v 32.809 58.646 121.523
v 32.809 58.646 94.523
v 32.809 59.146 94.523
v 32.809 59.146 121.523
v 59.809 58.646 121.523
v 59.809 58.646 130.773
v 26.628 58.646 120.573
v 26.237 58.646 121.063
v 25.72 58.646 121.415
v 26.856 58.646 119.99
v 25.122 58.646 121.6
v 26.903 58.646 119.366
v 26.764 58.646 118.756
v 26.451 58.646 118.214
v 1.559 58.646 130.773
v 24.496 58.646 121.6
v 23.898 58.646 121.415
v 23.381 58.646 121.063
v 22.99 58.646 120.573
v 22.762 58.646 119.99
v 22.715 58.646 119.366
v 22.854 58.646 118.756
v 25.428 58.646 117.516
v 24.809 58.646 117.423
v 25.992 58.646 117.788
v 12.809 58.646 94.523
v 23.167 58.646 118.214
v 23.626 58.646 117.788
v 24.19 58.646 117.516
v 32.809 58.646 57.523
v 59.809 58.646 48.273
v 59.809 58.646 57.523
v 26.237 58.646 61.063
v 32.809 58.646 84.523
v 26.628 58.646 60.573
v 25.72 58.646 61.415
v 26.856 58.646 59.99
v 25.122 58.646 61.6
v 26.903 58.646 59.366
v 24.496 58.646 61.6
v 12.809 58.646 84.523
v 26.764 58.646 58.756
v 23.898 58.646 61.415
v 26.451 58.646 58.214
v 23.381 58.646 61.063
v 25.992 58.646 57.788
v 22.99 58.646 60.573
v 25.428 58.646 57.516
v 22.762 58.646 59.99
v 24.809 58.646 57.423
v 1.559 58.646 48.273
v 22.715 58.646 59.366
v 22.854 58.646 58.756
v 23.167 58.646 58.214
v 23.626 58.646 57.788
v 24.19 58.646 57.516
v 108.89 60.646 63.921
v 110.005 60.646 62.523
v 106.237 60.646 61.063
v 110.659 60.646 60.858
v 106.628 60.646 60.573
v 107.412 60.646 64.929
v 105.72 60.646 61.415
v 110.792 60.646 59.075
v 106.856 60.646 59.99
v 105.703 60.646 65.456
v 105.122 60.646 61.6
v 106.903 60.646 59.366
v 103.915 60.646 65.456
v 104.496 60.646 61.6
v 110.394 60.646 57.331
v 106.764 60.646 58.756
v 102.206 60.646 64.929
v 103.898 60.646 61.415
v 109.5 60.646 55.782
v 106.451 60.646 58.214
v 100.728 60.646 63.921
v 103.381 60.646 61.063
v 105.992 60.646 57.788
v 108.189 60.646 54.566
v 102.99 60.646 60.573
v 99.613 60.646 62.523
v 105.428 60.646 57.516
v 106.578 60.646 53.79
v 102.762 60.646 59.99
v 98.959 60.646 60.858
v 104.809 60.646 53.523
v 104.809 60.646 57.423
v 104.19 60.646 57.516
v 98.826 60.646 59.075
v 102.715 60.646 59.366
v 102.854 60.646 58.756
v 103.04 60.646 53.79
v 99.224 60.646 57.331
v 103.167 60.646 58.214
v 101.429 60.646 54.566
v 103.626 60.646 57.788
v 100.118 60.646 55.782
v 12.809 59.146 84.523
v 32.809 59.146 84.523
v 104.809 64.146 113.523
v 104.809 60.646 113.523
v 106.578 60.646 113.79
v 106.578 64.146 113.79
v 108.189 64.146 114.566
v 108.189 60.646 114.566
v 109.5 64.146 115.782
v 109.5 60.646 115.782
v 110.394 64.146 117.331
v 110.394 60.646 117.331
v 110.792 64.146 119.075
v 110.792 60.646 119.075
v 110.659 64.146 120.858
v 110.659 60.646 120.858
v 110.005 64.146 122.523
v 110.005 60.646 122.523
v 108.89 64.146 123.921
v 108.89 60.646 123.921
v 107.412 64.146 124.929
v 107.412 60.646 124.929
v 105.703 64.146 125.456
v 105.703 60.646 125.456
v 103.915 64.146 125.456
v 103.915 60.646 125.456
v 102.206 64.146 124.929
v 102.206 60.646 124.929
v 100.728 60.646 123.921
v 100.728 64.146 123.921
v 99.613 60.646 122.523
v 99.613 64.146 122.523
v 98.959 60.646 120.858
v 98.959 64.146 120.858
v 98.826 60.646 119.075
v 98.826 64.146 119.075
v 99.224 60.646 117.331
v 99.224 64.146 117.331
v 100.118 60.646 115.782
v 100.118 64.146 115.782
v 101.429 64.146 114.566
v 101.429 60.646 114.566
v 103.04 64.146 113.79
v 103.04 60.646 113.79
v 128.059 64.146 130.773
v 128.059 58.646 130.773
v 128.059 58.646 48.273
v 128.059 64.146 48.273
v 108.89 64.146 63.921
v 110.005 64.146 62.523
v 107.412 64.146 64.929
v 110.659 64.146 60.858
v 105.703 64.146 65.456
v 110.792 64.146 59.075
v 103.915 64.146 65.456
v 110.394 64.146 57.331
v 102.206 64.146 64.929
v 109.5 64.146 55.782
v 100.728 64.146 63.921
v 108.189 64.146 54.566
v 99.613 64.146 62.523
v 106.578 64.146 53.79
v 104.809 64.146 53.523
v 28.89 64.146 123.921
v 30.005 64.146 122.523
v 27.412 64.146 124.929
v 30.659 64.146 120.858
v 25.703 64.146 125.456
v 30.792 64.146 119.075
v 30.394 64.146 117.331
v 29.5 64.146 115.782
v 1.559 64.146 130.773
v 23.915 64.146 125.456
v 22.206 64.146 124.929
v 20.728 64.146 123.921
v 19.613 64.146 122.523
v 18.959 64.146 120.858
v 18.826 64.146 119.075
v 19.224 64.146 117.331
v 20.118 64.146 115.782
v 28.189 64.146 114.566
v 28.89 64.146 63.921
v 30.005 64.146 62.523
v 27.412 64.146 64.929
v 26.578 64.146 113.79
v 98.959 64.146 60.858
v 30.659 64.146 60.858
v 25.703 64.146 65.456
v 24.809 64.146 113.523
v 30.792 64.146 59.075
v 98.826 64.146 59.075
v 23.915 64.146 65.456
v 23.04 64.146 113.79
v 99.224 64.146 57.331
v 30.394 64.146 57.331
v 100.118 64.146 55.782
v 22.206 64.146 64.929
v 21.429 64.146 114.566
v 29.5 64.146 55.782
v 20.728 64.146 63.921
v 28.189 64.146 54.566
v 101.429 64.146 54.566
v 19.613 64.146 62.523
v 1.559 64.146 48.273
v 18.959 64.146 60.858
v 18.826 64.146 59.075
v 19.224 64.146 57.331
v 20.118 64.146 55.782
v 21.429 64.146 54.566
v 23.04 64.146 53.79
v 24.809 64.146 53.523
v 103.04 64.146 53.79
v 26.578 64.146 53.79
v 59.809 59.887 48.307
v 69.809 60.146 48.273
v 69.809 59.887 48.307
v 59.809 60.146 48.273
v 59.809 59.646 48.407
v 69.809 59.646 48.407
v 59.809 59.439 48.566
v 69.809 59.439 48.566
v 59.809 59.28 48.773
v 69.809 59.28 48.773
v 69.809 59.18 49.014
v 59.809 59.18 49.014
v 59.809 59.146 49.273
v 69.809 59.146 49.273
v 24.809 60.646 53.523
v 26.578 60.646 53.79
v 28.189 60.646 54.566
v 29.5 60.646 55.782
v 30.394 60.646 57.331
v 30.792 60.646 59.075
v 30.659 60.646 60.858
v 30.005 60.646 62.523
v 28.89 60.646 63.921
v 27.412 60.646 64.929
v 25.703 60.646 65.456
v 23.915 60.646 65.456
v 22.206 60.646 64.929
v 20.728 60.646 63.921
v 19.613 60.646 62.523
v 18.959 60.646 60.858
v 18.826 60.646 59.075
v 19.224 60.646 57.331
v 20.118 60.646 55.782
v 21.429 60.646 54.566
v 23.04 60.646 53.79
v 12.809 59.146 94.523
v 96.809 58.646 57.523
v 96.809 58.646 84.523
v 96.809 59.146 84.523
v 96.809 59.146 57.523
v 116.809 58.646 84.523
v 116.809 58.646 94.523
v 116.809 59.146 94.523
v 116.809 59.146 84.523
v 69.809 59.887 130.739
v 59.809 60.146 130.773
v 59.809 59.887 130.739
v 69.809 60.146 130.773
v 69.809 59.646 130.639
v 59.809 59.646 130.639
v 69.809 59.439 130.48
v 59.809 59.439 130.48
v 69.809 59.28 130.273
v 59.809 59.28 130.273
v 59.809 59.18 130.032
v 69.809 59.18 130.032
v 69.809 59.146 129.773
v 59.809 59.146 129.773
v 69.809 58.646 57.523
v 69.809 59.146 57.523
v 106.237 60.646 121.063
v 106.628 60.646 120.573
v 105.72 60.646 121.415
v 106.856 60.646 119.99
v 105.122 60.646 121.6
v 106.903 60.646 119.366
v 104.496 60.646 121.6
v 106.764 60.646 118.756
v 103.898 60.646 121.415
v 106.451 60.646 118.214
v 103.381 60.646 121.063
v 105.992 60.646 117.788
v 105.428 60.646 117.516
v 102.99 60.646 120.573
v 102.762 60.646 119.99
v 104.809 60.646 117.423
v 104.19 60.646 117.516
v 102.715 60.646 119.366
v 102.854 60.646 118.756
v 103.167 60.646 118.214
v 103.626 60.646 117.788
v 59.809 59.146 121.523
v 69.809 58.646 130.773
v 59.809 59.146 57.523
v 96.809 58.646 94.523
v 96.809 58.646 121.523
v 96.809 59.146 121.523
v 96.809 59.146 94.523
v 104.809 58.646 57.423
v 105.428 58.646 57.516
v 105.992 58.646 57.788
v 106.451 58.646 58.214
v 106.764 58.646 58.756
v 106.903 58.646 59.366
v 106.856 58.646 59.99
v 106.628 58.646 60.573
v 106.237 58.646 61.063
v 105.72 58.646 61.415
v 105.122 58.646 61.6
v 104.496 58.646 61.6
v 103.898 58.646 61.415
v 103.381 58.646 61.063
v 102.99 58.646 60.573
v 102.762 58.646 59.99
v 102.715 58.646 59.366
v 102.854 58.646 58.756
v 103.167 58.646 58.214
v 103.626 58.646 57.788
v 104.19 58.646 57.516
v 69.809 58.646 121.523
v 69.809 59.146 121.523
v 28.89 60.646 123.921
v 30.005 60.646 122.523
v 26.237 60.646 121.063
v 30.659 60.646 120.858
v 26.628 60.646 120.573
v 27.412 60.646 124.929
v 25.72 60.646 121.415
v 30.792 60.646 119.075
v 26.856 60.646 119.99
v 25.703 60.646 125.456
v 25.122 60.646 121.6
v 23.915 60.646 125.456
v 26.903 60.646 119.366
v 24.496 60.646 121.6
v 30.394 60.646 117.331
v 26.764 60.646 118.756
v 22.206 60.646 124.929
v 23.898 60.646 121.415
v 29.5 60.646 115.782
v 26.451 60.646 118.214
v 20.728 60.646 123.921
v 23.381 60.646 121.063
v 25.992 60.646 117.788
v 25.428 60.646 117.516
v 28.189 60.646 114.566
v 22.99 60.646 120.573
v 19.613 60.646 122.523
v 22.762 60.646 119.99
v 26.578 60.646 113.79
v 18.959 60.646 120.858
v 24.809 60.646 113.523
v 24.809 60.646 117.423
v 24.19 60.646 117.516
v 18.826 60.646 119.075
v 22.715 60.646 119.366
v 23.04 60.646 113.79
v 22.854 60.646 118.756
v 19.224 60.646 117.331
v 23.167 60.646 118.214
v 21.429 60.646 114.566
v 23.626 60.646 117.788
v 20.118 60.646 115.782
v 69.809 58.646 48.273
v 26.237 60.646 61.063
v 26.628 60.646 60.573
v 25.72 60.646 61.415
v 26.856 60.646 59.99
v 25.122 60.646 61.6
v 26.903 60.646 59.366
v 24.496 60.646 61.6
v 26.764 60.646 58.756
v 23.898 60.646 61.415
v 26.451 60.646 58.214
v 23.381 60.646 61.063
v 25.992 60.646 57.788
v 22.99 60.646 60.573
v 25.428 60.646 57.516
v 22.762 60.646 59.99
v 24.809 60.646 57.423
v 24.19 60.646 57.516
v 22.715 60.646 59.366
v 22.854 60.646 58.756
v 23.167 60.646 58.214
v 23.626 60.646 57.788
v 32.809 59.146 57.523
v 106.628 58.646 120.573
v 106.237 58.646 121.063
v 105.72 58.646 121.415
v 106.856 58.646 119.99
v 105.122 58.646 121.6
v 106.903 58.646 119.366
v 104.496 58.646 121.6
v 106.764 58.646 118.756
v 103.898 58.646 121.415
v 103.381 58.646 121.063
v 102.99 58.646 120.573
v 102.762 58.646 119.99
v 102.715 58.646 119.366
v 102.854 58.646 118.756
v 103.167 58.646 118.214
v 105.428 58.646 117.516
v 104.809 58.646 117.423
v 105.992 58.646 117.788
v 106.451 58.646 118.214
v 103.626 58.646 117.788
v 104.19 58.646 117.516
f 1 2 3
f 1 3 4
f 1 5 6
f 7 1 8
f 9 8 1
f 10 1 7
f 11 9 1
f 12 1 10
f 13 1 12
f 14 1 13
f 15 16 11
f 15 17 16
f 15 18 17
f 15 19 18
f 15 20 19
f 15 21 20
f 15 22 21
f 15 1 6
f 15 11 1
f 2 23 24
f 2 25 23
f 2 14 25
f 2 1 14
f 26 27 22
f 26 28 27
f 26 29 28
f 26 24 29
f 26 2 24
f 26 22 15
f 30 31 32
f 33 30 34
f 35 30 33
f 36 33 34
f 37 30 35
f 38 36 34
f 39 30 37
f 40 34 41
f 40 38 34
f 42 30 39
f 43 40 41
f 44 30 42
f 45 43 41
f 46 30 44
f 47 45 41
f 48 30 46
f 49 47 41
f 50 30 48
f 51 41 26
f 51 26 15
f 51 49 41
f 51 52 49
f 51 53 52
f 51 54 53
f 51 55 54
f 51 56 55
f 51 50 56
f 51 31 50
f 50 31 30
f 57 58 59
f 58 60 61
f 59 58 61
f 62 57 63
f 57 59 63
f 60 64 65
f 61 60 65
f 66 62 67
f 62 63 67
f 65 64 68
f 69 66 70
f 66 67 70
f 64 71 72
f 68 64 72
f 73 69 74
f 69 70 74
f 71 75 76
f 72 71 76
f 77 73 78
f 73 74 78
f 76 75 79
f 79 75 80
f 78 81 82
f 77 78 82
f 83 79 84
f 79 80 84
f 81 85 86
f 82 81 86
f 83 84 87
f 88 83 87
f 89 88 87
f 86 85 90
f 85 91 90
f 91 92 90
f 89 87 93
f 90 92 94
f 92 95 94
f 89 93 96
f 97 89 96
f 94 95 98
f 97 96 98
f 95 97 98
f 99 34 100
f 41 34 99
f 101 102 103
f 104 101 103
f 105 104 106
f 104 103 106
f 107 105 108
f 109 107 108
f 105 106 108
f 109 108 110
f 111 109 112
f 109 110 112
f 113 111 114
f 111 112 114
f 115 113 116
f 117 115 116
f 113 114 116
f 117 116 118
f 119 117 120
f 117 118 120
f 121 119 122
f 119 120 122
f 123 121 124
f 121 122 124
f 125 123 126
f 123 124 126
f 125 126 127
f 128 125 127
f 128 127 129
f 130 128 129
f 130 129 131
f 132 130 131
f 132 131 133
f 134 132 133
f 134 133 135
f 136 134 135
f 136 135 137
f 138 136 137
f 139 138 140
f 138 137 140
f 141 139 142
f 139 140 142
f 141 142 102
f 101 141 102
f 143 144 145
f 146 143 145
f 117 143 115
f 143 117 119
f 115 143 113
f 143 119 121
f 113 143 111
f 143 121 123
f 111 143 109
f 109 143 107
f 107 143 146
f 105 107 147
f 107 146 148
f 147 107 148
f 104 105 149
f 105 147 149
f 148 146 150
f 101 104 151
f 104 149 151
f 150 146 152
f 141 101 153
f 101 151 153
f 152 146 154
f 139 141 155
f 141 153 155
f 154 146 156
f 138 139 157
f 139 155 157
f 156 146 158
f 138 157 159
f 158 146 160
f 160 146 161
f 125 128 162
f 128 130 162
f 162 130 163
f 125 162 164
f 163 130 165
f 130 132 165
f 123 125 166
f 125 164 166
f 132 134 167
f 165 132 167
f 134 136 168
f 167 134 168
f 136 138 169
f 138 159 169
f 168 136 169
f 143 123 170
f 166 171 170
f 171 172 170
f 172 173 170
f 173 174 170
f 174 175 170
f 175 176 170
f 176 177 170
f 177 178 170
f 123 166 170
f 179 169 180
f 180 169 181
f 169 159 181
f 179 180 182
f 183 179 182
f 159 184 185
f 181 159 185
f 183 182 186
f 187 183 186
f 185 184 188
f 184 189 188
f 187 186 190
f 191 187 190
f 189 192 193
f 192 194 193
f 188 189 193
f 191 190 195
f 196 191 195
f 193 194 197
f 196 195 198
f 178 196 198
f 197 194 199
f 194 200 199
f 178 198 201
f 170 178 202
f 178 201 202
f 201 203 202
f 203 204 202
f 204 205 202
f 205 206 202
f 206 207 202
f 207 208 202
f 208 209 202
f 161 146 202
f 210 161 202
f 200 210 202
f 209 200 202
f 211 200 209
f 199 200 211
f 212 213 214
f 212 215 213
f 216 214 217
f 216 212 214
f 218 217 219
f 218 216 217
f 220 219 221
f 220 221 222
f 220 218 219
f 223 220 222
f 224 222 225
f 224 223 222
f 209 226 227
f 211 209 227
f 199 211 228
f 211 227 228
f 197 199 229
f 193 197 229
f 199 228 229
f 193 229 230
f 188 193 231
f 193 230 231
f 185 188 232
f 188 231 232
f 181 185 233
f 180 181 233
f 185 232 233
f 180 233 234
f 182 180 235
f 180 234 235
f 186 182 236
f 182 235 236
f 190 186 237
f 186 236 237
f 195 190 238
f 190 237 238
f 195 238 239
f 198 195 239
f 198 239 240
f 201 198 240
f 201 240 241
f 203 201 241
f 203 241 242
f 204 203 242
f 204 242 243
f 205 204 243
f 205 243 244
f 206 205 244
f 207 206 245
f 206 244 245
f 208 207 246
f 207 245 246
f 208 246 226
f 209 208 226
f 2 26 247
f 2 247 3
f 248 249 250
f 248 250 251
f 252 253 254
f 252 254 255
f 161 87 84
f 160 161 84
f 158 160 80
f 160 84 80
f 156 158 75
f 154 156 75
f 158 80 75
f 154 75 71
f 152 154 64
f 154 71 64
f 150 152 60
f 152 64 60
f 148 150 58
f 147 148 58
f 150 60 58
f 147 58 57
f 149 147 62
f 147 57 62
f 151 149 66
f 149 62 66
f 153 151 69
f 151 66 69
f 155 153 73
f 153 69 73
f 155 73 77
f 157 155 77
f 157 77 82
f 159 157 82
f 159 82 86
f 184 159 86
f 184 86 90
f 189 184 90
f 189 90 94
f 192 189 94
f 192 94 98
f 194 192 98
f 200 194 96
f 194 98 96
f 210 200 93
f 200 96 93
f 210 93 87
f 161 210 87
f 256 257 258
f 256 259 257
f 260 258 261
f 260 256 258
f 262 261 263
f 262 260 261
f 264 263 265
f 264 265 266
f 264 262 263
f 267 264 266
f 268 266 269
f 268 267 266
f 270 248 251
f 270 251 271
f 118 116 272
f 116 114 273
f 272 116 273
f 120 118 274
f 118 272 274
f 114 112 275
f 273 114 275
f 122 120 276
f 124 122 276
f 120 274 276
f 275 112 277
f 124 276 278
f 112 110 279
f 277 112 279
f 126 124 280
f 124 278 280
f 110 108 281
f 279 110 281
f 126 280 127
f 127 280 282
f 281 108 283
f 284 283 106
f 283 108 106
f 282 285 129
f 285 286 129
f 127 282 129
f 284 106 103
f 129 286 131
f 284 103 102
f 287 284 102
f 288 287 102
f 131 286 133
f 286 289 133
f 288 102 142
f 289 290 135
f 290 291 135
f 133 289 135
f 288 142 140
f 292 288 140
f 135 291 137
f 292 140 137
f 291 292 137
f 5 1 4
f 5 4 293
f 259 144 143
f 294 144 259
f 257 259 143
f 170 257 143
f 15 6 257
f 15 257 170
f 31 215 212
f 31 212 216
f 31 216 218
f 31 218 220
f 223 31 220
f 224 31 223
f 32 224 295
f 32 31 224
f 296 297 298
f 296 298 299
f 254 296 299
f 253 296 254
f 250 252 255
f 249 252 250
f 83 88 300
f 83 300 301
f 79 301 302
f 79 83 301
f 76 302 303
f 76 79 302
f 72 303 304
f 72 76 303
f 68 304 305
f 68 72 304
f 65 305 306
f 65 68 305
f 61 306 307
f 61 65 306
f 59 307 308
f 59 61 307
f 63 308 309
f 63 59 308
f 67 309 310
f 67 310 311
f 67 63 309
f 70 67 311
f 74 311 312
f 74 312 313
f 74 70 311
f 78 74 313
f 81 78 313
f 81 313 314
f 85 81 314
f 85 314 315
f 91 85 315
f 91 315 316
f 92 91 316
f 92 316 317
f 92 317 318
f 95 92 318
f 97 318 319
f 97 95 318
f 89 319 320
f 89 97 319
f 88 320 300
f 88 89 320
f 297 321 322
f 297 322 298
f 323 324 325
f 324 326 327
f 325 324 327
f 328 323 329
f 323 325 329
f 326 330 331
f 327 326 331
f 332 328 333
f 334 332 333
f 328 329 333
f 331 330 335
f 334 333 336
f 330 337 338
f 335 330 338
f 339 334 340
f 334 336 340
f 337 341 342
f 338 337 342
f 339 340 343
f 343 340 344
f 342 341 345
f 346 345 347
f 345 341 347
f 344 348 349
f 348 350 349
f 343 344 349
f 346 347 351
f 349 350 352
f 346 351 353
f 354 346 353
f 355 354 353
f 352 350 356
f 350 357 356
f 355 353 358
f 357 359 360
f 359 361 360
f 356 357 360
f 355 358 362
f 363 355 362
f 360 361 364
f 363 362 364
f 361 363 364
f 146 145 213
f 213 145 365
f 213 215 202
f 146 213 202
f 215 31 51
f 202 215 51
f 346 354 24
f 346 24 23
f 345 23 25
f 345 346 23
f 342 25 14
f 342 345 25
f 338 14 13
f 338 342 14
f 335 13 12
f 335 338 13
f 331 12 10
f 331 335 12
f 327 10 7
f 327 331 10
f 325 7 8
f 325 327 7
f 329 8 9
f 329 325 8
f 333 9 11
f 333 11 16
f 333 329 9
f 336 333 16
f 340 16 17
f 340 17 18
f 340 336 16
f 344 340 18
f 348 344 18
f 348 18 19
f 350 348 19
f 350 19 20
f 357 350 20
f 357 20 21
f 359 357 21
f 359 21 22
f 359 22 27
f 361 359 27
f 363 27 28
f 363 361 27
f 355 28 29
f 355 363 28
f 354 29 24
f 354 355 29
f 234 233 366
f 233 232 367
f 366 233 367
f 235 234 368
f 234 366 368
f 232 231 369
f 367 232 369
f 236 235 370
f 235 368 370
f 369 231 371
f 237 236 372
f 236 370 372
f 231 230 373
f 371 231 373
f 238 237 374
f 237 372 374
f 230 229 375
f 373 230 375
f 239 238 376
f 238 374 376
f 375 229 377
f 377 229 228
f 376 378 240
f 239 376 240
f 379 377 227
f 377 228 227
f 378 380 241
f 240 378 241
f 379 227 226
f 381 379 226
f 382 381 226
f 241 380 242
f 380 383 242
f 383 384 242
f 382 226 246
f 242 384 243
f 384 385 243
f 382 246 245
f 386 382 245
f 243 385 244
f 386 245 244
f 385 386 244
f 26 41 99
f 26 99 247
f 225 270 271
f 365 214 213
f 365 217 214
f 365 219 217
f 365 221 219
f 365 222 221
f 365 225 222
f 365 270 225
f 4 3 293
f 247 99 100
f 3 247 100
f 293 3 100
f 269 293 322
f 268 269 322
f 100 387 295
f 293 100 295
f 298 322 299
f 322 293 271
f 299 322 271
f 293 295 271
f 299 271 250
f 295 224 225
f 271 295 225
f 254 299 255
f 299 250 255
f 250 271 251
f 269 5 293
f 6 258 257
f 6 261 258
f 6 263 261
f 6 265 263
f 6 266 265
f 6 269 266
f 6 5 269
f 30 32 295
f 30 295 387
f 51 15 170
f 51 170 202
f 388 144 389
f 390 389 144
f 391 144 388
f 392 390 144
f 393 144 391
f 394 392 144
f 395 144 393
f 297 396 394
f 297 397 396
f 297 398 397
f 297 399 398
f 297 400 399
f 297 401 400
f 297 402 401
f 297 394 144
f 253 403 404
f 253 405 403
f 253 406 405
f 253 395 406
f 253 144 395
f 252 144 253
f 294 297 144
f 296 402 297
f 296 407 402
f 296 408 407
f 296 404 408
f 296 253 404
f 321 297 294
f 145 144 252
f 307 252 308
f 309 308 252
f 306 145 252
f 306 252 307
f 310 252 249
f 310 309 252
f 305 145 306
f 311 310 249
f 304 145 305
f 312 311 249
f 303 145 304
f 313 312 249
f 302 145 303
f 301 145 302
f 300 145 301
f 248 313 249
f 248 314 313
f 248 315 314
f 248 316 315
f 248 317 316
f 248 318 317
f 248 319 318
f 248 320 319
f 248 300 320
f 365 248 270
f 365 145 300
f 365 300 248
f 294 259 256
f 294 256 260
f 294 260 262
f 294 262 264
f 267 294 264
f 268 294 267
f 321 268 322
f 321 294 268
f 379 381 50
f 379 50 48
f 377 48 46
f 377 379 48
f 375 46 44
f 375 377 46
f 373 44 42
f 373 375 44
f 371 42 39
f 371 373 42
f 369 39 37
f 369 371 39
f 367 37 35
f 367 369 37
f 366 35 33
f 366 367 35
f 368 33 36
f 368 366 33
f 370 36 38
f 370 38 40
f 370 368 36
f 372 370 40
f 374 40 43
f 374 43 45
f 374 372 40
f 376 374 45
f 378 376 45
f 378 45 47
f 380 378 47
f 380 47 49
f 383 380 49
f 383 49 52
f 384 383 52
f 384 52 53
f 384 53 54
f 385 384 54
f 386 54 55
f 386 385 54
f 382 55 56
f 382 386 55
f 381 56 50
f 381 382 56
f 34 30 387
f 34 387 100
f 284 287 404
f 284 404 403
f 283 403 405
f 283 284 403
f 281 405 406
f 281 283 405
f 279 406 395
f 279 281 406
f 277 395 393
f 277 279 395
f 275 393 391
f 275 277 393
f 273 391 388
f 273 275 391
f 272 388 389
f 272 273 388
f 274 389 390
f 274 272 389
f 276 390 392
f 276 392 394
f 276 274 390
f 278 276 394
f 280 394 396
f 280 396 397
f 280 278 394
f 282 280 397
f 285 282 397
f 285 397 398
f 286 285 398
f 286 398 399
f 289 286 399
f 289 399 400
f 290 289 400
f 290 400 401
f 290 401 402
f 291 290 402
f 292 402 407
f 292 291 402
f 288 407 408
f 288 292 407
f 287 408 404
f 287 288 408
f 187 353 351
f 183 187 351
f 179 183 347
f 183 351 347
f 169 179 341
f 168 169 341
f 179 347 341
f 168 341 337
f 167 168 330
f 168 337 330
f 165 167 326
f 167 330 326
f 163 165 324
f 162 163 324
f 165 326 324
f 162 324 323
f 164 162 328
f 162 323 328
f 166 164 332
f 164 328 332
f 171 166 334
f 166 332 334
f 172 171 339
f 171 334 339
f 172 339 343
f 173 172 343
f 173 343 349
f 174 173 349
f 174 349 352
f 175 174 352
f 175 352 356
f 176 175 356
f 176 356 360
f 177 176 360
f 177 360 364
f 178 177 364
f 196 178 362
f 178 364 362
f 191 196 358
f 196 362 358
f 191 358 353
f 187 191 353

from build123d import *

# Parameters (mm, degrees)
SKETCH_1_W          = 126.5
SKETCH_1_H          = 82.5
SKETCH_1_R          = 2.1
EXTRUDE_1_DEPTH     = 2
CUT_EXTRUDE_1_DEPTH = 0.5
FILLET_1_R          = 1
SKETCH_4_W          = 126.5
SKETCH_4_H          = 82.5
SKETCH_4_R          = 6
EXTRUDE_3_DEPTH     = 3.5


with BuildPart() as part:
    # Эскиз1 → Бобышка-Вытянуть1 (new body)
    with BuildSketch(Plane(origin=(0, 60.645974268, 0), x_dir=(-1, 0, 0), z_dir=(0, -1, 0))):
        with Locations((-64.808980694, -89.523129836)):
            Rectangle(SKETCH_1_W, SKETCH_1_H)
        with Locations(Location((-24.808980694, -59.523129836, 0), (0, 0, 90))):
            Circle(SKETCH_1_R, mode=Mode.SUBTRACT)
        with Locations(Location((-104.808980694, -59.523129836, 0), (0, 0, 90))):
            Circle(SKETCH_1_R, mode=Mode.SUBTRACT)
        with Locations(Location((-24.808980694, -119.523129836, 0), (0, 0, 90))):
            Circle(SKETCH_1_R, mode=Mode.SUBTRACT)
        with Locations(Location((-104.808980694, -119.523129836, 0), (0, 0, 90))):
            Circle(SKETCH_1_R, mode=Mode.SUBTRACT)
    extrude(amount=EXTRUDE_1_DEPTH)

    # Эскиз3 → Вырез-Вытянуть1 (cut)
    with BuildSketch(Plane(origin=(0, 58.645974268, 0), x_dir=(-1, 0, 0), z_dir=(0, -1, 0))):
        Polygon((-59.808980694, -57.523129836), (-32.808980694, -57.523129836), (-32.808980694, -84.523129836), (-12.808980694, -84.523129836), (-12.808980694, -94.523129836), (-32.808980694, -94.523129836), (-32.808980694, -121.523129836), (-59.808980694, -121.523129836), (-59.808980694, -130.773129836), (-69.808980694, -130.773129836), (-69.808980694, -121.523129836), (-96.808980694, -121.523129836), (-96.808980694, -94.523129836), (-116.808980694, -94.523129836), (-116.808980694, -84.523129836), (-96.808980694, -84.523129836), (-96.808980694, -57.523129836), (-69.808980694, -57.523129836), (-69.808980694, -48.273129836), (-59.808980694, -48.273129836), align=None)
    extrude(amount=-CUT_EXTRUDE_1_DEPTH, mode=Mode.SUBTRACT)

    # Скругление1
    fillet_1_edges = [part.edges().sort_by_distance(p)[0] for p in [
        (64.808980694, 59.145974268, 130.773129836),
        (64.808980694, 59.145974268, 48.273129836),
    ]]
    fillet(fillet_1_edges, radius=FILLET_1_R)

    # Эскиз4 → Бобышка-Вытянуть3 (add)
    with BuildSketch(Plane(origin=(0, 60.645974268, 0), x_dir=(-1, 0, 0), z_dir=(0, -1, 0))):
        with Locations((-64.808980694, -89.523129836)):
            Rectangle(SKETCH_4_W, SKETCH_4_H)
        with Locations(Location((-24.808980694, -59.523129836, 0), (0, 0, 90))):
            Circle(SKETCH_4_R, mode=Mode.SUBTRACT)
        with Locations(Location((-104.808980694, -59.523129836, 0), (0, 0, 90))):
            Circle(SKETCH_4_R, mode=Mode.SUBTRACT)
        with Locations(Location((-104.808980694, -119.523129836, 0), (0, 0, 90))):
            Circle(SKETCH_4_R, mode=Mode.SUBTRACT)
        with Locations(Location((-24.808980694, -119.523129836, 0), (0, 0, 90))):
            Circle(SKETCH_4_R, mode=Mode.SUBTRACT)
    extrude(amount=-EXTRUDE_3_DEPTH)


solid = part.part
